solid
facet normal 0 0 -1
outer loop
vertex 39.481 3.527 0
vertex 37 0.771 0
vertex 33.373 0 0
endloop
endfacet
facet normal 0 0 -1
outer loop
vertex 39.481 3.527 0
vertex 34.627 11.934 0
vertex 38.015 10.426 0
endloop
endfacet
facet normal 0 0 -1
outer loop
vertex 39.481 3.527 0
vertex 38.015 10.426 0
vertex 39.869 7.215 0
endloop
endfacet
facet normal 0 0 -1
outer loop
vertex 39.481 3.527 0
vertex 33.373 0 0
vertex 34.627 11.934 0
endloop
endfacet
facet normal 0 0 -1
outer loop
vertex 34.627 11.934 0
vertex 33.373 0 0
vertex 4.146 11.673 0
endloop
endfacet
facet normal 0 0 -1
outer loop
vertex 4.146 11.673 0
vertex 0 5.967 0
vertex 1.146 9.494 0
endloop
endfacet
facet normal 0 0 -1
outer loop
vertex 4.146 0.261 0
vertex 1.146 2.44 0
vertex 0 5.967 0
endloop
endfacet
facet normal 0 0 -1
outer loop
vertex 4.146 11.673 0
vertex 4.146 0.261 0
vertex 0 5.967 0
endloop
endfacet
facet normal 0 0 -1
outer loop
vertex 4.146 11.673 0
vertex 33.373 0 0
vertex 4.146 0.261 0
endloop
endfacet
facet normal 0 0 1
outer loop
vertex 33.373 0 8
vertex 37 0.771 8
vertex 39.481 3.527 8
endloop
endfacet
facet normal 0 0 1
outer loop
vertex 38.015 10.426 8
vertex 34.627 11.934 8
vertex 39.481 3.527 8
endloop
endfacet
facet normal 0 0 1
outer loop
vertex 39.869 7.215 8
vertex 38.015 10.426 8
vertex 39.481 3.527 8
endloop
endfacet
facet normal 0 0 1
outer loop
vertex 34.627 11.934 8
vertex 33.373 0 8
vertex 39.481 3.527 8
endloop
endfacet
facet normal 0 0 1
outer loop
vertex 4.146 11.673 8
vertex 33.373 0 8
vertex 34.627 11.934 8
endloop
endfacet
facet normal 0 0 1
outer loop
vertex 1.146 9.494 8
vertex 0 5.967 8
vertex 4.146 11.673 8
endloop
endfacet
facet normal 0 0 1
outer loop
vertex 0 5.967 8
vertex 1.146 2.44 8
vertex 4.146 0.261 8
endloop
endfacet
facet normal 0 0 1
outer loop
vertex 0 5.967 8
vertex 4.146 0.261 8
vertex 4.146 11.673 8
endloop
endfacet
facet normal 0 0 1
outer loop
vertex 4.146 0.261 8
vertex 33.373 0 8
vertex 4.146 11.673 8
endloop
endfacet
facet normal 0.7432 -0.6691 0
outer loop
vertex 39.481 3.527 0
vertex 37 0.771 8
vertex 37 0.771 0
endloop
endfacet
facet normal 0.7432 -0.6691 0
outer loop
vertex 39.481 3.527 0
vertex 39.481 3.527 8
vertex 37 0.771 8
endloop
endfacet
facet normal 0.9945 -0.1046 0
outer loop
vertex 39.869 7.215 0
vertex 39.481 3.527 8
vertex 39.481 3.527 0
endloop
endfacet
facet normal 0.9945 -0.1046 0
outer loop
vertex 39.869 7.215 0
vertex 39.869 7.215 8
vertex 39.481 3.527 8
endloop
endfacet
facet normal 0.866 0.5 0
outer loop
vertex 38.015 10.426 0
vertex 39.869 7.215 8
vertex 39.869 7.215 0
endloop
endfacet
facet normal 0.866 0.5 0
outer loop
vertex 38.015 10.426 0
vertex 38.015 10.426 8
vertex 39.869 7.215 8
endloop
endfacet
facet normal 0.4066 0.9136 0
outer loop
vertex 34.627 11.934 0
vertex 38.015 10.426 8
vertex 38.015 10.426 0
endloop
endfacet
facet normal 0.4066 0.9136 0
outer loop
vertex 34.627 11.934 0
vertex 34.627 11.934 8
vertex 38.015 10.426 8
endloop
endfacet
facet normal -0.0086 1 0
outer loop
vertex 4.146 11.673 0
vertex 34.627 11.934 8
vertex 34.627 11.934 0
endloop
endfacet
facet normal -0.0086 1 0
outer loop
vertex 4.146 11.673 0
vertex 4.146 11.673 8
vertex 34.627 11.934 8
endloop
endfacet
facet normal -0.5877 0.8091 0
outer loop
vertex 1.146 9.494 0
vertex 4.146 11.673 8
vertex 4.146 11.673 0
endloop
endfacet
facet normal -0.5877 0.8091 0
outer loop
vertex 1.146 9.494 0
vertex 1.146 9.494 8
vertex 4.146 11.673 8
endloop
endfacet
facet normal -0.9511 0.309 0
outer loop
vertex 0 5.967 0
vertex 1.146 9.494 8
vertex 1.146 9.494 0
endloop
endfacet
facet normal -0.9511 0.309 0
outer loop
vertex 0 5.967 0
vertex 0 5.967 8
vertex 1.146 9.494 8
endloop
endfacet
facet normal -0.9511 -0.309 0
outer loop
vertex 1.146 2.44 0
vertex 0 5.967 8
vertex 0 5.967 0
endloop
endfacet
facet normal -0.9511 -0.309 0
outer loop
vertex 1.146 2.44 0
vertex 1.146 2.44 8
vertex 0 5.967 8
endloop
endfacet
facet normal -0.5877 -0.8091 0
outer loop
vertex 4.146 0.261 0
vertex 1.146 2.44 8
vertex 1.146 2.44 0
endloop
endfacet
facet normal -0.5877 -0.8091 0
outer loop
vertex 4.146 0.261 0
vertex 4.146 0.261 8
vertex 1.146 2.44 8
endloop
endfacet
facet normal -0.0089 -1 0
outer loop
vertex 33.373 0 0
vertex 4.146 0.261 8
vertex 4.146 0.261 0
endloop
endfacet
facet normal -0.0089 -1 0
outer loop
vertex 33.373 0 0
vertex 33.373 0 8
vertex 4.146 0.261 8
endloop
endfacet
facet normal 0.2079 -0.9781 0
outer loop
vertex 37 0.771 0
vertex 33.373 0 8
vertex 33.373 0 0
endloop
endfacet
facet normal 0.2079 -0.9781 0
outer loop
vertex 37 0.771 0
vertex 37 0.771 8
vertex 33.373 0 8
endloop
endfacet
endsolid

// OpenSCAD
$fn = 32;
// ----------------------------------------------------------------------
// Key bar: parallel key, 8 mm thick
// ----------------------------------------------------------------------

// --- parameters (mm) ---
profile_height = 8;       // extrusion height
profile_points = 11;      // points of the closed outline

profile = [[0, 5.967], [1.146, 2.44], [4.146, 0.261], [33.373, 0], [37, 0.771], [39.481, 3.527], [39.869, 7.215], [38.015, 10.426], [34.627, 11.934], [4.146, 11.673], [1.146, 9.494]];  // single closed polygon, 11 points, counter clockwise

// --- the one profile operation ---
linear_extrude(height = profile_height) polygon(points = profile);
